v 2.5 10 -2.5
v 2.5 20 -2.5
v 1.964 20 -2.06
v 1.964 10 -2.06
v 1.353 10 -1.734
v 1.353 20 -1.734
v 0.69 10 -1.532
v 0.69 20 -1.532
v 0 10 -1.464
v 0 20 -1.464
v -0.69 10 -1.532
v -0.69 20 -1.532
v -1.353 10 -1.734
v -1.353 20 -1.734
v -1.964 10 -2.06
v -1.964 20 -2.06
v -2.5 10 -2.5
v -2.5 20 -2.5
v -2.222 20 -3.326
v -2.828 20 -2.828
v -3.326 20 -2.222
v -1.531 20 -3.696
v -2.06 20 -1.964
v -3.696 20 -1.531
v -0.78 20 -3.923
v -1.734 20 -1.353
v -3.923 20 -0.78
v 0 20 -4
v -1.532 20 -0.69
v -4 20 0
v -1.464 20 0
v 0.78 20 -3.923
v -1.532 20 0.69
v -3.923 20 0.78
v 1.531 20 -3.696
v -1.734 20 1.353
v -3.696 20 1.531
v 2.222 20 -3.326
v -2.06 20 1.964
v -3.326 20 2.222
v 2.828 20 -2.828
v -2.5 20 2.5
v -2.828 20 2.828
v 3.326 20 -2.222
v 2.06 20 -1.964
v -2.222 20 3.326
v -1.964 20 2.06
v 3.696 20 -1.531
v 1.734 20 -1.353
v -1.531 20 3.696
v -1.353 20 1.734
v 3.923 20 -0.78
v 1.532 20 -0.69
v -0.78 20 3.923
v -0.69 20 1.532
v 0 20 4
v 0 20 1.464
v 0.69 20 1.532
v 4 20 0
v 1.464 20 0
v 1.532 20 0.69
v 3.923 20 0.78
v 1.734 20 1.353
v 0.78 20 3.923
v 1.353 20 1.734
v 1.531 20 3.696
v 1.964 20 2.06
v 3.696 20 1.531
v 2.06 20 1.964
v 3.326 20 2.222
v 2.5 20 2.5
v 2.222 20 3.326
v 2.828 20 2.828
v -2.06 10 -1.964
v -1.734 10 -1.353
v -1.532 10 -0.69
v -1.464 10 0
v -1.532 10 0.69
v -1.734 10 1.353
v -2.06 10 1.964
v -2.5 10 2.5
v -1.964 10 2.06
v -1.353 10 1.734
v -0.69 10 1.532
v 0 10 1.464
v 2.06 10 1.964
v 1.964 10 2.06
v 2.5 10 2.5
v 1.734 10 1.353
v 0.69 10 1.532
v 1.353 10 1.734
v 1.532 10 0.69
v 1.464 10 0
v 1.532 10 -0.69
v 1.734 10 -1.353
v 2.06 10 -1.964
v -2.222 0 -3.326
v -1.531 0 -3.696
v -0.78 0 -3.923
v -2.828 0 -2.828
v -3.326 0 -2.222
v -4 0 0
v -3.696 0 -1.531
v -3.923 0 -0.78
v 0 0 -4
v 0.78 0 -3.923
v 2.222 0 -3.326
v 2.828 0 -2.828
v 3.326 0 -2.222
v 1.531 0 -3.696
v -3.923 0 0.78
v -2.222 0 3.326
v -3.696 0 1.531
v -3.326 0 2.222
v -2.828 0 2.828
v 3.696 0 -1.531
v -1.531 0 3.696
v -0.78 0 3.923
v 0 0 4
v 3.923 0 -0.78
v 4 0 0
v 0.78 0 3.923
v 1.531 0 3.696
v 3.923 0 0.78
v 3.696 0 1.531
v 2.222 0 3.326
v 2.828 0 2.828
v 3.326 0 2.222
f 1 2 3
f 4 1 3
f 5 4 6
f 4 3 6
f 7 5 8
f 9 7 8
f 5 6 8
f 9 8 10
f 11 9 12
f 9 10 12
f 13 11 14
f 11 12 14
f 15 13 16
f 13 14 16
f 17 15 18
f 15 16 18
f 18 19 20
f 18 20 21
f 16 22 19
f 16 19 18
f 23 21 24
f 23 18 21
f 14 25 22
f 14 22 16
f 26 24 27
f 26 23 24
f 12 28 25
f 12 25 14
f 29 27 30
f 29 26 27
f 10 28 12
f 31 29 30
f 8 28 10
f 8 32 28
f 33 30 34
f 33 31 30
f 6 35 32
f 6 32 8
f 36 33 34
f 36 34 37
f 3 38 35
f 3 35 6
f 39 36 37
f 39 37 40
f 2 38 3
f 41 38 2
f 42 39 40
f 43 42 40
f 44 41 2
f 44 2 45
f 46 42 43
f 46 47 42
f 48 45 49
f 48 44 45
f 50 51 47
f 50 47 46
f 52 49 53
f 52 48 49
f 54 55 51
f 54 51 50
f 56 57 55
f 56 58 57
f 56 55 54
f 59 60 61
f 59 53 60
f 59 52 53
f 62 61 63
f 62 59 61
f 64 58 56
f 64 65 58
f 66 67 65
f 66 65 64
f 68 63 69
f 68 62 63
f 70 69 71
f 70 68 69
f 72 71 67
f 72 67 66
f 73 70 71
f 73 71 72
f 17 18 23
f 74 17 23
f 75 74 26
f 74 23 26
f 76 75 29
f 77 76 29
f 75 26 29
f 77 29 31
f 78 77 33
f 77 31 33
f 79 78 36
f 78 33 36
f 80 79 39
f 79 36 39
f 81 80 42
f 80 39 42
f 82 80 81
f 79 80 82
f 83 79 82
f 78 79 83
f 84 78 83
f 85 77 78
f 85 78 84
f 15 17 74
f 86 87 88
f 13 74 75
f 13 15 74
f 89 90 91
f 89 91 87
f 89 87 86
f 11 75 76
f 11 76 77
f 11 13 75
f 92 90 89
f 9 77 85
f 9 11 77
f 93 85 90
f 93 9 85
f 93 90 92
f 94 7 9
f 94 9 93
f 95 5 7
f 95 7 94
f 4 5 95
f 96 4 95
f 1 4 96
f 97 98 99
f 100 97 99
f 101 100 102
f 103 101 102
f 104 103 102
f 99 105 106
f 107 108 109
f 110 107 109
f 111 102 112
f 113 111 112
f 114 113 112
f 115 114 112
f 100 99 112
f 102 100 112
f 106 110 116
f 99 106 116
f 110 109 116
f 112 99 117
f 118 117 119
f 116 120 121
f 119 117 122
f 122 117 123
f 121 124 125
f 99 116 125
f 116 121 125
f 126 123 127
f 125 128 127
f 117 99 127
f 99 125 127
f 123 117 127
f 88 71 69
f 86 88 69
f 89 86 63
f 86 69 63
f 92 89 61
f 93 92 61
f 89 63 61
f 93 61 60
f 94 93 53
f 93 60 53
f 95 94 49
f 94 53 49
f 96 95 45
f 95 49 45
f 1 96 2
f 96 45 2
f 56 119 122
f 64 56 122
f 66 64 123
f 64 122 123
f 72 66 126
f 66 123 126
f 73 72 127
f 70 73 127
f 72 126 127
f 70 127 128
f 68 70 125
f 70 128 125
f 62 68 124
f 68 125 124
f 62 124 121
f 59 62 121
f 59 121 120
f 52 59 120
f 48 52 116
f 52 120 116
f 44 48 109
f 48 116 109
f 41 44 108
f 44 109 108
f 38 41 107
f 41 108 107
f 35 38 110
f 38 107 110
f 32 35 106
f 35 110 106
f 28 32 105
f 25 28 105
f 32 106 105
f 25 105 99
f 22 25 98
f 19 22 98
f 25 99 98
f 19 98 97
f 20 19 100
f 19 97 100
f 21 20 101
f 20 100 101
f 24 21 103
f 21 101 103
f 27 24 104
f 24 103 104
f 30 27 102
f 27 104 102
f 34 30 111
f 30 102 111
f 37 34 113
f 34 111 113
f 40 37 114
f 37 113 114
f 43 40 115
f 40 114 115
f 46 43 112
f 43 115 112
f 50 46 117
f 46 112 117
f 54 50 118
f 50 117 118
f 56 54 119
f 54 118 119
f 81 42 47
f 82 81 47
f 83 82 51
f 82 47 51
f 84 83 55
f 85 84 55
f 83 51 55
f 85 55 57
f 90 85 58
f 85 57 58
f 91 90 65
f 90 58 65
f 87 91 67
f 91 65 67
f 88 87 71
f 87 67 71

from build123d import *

# Parameters (mm, degrees)
SKETCH1_R           = 4
BOSS_EXTRUDE1_DEPTH = 20
CUT_EXTRUDE1_DEPTH  = 10


with BuildPart() as part:
    # Sketch1 → Boss-Extrude1 (new body)
    with BuildSketch(Plane(origin=(0, 0, 0), x_dir=(1, 0, 0), z_dir=(0, 1, 0))):
        with Locations(Location((0, 0, 0), (0, 0, 270))):
            Circle(SKETCH1_R)
    extrude(amount=BOSS_EXTRUDE1_DEPTH)

    # Sketch2 → Cut-Extrude1 (cut)
    with BuildSketch(Plane(origin=(0, 20, 0), x_dir=(1, 0, 0), z_dir=(0, 1, 0))):
        with BuildLine():
            ThreePointArc((2.5, 2.5), (0, 1.464466094), (-2.5, 2.5))
            ThreePointArc((-2.5, 2.5), (-1.464466094, 0), (-2.5, -2.5))
            ThreePointArc((-2.5, -2.5), (0, -1.464466094), (2.5, -2.5))
            ThreePointArc((2.5, -2.5), (1.464466094, 0), (2.5, 2.5))
        make_face()
    extrude(amount=-CUT_EXTRUDE1_DEPTH, mode=Mode.SUBTRACT)


solid = part.part
